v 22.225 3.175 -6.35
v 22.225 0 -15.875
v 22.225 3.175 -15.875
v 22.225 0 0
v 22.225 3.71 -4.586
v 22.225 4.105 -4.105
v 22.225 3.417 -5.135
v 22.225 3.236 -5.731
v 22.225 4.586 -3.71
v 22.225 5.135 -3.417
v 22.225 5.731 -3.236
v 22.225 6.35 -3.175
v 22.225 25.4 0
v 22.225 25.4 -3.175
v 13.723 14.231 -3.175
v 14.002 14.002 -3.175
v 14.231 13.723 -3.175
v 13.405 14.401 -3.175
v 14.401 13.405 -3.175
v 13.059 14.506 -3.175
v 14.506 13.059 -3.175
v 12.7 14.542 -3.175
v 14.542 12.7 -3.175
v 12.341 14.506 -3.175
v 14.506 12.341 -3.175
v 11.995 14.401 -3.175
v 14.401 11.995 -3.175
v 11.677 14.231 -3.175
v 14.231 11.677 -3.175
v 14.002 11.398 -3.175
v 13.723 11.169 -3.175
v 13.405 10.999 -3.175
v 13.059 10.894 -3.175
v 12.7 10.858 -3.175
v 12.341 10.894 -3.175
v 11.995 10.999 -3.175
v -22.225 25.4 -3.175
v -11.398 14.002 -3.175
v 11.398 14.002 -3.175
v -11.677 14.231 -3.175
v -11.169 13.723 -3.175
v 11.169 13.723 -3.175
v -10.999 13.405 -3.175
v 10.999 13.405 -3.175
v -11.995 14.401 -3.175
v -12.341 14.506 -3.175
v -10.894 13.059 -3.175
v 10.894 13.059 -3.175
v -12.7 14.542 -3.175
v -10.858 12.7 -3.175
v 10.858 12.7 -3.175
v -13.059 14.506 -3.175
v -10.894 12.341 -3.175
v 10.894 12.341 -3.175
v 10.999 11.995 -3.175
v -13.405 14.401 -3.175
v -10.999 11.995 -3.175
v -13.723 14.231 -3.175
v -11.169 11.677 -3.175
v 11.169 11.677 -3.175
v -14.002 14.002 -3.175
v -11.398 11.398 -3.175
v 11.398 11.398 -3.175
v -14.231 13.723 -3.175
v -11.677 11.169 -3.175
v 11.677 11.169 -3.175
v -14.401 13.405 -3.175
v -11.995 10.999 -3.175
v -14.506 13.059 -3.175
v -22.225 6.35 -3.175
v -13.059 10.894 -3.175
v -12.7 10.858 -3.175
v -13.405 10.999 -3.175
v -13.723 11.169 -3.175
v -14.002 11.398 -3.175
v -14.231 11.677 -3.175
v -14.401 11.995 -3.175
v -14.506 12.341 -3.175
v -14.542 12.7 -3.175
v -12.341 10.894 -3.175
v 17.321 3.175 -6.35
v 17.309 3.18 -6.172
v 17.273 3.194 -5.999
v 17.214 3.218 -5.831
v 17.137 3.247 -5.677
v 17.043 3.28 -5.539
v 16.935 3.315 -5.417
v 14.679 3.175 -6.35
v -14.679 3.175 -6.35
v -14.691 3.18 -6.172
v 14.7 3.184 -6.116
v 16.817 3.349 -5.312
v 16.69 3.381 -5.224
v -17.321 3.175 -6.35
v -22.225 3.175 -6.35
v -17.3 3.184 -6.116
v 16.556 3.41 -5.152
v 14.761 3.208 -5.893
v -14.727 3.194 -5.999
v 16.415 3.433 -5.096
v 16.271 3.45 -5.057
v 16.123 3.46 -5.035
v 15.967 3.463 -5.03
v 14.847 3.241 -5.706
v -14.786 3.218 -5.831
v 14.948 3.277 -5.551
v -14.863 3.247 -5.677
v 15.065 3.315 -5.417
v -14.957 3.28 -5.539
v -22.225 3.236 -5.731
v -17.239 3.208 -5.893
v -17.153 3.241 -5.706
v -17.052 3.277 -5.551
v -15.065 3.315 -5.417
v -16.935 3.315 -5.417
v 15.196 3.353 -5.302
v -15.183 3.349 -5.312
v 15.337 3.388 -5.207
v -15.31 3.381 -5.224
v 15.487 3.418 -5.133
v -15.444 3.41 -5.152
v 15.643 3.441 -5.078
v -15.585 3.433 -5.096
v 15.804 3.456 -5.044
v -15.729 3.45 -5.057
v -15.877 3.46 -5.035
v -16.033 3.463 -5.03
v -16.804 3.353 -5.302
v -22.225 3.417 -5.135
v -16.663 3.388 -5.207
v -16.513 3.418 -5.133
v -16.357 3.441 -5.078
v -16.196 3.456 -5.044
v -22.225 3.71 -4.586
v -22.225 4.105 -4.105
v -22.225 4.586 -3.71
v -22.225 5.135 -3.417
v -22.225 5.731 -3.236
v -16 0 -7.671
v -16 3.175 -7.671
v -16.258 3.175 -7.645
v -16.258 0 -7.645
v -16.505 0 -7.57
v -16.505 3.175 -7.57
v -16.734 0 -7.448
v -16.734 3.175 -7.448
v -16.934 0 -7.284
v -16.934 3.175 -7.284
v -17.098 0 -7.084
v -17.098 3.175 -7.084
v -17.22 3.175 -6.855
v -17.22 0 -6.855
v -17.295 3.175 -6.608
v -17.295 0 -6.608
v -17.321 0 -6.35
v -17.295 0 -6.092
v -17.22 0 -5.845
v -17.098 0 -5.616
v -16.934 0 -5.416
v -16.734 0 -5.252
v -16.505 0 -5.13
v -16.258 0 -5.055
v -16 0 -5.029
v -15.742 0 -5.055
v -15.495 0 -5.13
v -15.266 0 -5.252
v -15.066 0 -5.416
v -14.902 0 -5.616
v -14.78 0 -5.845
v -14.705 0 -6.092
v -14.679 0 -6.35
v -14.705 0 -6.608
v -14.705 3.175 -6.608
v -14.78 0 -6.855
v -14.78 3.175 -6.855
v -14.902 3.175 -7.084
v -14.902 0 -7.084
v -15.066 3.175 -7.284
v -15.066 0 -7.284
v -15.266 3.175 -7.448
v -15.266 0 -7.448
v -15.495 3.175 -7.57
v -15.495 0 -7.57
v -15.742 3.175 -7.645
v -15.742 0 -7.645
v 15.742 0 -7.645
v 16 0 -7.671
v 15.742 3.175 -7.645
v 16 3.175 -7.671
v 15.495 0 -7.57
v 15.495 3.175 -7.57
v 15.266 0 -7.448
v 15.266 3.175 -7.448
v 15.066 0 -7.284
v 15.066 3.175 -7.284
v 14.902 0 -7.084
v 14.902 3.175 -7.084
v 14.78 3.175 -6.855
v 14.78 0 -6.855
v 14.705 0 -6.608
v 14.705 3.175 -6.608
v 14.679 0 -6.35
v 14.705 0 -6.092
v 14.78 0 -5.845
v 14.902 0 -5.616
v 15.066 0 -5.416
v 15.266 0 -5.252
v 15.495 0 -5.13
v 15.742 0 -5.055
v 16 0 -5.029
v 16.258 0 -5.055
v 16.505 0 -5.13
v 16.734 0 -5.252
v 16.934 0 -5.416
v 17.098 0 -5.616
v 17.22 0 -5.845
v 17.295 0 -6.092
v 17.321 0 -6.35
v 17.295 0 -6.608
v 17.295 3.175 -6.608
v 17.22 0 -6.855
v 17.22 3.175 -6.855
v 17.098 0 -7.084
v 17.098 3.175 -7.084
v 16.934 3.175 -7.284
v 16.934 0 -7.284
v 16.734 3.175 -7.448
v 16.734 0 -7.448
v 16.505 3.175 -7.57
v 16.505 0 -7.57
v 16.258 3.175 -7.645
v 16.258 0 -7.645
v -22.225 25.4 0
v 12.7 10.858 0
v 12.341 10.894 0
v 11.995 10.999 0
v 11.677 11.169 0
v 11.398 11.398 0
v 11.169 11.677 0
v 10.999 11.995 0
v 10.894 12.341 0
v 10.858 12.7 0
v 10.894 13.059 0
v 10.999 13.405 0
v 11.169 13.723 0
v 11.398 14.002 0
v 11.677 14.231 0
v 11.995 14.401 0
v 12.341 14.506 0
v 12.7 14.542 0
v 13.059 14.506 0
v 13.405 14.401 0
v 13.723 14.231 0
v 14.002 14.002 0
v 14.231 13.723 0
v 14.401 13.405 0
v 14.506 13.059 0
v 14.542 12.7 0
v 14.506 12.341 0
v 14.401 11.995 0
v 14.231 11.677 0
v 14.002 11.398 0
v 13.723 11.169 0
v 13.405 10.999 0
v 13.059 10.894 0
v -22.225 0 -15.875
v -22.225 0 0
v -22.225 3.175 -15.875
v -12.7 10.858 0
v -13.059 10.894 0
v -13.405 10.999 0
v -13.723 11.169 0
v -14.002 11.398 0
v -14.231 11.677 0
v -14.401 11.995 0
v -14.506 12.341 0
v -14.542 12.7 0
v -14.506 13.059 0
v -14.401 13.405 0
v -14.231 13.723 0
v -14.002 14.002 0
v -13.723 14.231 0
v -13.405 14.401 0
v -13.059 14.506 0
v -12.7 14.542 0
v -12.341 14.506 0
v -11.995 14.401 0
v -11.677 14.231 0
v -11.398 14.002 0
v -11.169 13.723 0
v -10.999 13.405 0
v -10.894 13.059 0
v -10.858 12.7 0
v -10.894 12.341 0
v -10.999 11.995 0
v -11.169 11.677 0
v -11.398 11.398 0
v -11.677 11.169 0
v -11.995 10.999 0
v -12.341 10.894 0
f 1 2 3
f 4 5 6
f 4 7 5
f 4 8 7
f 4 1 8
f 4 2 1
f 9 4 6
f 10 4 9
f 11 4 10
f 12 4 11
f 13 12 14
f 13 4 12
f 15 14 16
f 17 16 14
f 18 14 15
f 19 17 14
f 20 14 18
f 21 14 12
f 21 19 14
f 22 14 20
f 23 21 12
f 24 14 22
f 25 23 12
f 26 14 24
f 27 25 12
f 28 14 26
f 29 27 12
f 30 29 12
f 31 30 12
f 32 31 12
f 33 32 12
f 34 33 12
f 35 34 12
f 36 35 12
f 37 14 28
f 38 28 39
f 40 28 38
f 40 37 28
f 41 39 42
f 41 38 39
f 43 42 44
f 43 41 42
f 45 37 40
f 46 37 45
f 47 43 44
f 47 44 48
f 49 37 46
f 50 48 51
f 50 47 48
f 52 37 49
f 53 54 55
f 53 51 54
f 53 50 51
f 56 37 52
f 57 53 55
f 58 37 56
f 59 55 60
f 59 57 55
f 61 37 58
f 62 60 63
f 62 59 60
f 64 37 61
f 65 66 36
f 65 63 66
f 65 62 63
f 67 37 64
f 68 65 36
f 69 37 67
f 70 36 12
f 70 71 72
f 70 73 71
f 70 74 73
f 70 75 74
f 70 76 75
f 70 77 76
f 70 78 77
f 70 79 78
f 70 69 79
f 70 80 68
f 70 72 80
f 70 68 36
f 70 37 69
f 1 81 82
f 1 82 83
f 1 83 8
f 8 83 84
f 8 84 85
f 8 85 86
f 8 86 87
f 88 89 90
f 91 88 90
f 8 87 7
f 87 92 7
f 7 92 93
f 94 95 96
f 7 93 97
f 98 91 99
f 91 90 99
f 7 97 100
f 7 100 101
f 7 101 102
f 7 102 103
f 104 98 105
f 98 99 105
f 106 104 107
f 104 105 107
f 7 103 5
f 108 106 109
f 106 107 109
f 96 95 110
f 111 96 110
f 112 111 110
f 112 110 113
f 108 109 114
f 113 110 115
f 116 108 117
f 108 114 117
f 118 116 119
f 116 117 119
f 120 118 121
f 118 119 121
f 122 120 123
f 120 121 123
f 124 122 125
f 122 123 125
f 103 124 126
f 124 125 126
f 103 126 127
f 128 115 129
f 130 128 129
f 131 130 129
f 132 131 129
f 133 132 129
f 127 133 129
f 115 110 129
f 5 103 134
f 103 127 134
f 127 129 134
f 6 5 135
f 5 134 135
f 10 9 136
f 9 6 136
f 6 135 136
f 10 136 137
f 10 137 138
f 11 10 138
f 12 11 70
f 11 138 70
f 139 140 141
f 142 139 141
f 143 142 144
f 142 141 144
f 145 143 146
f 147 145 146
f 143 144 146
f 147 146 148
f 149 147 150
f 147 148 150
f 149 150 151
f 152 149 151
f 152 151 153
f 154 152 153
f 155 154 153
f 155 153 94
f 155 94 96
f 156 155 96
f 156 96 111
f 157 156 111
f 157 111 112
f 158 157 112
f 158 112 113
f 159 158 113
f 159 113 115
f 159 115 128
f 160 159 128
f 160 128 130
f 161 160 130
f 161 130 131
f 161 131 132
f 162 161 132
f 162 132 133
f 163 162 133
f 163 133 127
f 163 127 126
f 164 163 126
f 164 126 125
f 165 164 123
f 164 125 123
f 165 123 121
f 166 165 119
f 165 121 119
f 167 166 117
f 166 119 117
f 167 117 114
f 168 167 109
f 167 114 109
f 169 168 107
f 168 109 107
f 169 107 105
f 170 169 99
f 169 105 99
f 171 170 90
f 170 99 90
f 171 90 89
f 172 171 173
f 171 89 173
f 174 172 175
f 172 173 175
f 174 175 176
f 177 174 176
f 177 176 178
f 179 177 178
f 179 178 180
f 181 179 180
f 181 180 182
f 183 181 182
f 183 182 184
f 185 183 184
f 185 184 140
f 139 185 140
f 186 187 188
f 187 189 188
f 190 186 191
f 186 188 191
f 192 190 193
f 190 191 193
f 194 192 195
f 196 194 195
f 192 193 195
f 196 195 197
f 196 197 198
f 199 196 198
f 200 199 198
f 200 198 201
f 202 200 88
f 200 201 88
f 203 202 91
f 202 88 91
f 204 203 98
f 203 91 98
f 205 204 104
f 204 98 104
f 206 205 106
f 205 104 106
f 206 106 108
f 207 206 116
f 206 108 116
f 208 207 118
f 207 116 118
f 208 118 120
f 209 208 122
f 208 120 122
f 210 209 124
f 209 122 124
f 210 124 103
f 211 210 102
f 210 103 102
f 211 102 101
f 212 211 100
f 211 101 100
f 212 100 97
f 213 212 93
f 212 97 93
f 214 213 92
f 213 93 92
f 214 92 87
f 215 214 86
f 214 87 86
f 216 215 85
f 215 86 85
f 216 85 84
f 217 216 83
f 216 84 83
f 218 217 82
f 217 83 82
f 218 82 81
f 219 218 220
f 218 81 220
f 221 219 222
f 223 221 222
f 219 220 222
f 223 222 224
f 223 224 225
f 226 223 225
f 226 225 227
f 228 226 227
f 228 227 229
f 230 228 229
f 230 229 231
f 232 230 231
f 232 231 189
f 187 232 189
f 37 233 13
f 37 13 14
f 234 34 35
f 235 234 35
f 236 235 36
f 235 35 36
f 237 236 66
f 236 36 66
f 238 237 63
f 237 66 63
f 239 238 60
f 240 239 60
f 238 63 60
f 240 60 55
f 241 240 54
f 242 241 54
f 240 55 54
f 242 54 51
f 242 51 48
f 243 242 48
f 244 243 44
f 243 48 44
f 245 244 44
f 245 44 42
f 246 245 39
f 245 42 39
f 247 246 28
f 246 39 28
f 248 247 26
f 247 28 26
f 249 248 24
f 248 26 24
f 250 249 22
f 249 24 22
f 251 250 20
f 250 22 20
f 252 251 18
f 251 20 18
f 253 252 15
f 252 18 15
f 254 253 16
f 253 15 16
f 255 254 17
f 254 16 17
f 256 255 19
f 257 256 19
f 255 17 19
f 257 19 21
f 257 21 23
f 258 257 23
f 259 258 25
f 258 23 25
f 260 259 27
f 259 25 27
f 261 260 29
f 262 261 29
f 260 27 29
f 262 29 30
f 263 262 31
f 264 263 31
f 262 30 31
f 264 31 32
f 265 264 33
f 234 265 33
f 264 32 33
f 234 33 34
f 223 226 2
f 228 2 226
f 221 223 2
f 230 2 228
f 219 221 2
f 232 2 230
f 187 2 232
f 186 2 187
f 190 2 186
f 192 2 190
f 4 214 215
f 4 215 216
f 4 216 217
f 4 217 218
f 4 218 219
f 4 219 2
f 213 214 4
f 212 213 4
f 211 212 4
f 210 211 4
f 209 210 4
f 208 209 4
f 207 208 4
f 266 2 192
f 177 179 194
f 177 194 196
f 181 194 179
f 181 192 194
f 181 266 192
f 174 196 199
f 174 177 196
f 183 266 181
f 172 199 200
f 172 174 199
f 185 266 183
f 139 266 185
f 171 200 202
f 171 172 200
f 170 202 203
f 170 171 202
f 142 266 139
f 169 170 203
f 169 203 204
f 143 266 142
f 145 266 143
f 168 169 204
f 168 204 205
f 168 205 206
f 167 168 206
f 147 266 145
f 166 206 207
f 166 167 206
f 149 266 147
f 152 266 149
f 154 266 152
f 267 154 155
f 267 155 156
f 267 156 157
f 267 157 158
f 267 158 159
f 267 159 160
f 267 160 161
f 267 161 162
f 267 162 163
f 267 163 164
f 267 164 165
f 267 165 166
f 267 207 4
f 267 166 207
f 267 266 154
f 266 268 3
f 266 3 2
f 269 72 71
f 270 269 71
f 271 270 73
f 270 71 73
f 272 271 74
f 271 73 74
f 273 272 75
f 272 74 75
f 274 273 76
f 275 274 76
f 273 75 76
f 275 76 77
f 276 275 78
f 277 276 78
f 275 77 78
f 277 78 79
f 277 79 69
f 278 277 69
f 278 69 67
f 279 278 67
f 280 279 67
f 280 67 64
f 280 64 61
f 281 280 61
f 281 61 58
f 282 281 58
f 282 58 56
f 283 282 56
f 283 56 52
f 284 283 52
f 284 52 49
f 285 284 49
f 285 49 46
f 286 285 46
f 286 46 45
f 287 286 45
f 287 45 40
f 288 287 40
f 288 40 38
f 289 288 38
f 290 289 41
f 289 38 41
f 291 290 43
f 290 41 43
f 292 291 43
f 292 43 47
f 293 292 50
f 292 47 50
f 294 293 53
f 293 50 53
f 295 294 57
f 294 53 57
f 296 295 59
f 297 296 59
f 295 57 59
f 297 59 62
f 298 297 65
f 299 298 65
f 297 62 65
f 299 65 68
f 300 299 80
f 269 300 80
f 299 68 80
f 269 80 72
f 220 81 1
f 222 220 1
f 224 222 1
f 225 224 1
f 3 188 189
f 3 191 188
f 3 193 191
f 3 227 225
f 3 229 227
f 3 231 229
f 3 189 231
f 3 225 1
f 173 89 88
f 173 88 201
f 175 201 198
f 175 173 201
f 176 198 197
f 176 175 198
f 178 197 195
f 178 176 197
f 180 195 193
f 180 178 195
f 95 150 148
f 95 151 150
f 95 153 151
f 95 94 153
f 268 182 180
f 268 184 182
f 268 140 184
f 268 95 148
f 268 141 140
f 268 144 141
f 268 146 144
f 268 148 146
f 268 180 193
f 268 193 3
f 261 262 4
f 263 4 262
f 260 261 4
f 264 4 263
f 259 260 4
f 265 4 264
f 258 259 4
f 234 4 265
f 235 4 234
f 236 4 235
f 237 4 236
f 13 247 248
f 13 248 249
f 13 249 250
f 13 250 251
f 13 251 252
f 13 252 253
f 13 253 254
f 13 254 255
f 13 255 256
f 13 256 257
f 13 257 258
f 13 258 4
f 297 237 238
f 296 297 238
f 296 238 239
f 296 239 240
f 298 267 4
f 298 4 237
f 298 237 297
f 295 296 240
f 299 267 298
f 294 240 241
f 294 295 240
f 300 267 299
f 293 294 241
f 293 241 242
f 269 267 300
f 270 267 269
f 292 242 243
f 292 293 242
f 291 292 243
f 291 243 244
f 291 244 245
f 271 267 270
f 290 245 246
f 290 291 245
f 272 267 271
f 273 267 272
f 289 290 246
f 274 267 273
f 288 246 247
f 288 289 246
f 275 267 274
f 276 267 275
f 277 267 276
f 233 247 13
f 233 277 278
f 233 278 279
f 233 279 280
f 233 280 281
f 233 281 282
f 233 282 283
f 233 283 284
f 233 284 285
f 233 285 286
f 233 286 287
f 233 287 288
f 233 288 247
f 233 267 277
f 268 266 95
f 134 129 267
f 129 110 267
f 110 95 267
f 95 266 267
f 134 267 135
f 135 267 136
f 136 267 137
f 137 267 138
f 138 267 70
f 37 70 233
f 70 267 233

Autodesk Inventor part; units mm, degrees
ref_plane "YZ Plane" through (0, 0, 0) normal (1, 0, 0) x (0, 1, 0)
ref_plane "XZ Plane" through (0, 0, 0) normal (0, 1, 0) x (-1, 0, 0)
ref_plane "XY Plane" through (0, 0, 0) normal (0, 0, 1) x (1, 0, 0)
sketch "Sketch1" plane through (0, 0, 0) normal (1, 0, 0) x (0, 1, 0)
  line L0 (0, 0) -> (25.4, 0)
  line L1 (25.4, 0) -> (25.4, -3.175)
  line L2 (25.4, -3.175) -> (3.175, -3.175)
  line L3 (3.175, -3.175) -> (3.175, -15.875)
  line L4 (3.175, -15.875) -> (0, -15.875)
  line L5 (0, -15.875) -> (0, 0)
  dimension "d0" = 25.4
  dimension "d2" = 3.175
  dimension "d21" = 15.875
extrude "Extrusion1" add sketch "Sketch1" along normal mid plane 44.45
fillet "Fillet1" radius 3.175 1 edges at (0, 3.175, -3.175)
sketch "Sketch2" plane through (-22.225, 0, -15.875) normal (0, -1, 0) x (1, 0, 0)
  line L0 (38.225, 9.525) -> (6.225, 9.525) construction
  line L1 (0, 15.875) -> (44.45, 15.875) construction
  point P0 (22.225, 15.875)
  point P1 (22.225, 9.525)
  point P2 (22.225, 15.875)
  dimension "d6" = 6.35
  dimension "d7" = 32
hole "Hole1" at (16, 0, -6.35) at (-16, 0, -6.35) direction (0, 1, 0) diameter 2.6416 end through all thread size "6-32 UNC" class "2B" standard "ANSI Unified Screw Threads"
sketch "Sketch3" plane through (-22.225, 0, 0) normal (0, 0, 1) x (1, 0, 0)
  line L0 (0, 0) -> (44.45, 0) construction
  line L1 (0, 25.4) -> (44.45, 25.4) construction
  line L2 (34.925, 12.7) -> (9.525, 12.7) construction
  point P0 (22.225, 0)
  point P1 (22.225, 0)
  point P2 (22.225, 12.7)
  point P3 (22.225, 0)
  dimension "d15" = 25.4
  dimension "d22" = 12.7
hole "Hole2" at (12.7, 12.7, 0) at (-12.7, 12.7, 0) direction (0, 0, -1) diameter 3.683 end through all thread size "10-24 UNC" class "2B" standard "ANSI Unified Screw Threads"
properties part number "GP7-005" material "Aluminum 6061"
